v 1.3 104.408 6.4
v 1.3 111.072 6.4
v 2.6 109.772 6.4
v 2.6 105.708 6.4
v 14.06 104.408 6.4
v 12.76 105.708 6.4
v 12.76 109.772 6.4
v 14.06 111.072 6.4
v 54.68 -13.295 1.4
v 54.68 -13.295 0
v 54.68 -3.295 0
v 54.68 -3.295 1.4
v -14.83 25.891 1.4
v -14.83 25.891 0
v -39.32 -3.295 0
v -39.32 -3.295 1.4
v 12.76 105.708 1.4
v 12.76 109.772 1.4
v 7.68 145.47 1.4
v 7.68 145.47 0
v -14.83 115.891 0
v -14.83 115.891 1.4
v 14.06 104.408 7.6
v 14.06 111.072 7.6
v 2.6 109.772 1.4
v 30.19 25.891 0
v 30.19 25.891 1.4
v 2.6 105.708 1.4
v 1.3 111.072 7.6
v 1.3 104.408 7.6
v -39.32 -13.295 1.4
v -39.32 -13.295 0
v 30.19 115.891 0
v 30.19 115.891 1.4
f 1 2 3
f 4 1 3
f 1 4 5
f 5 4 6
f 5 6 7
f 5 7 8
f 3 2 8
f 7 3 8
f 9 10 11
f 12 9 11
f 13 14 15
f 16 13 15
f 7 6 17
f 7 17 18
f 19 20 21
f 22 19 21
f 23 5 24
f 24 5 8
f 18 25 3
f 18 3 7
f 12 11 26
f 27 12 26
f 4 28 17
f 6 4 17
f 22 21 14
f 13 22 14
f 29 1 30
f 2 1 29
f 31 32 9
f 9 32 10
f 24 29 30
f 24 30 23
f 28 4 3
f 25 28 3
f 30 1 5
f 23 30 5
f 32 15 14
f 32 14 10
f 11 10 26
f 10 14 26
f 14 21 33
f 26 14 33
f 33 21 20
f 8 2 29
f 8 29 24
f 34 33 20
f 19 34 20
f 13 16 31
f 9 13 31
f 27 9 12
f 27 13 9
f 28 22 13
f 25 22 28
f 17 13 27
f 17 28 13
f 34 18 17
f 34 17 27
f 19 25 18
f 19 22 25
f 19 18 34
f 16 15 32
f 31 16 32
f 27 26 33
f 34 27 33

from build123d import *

# Parameters (mm, degrees)
F1_DEPTH = 1.4
F2_W     = 10.16
F2_H     = 4.064
F3_DEPTH = 5
F4_W     = 12.76
F4_H     = 6.664
F5_DEPTH = 1.2


with BuildPart() as f1:
    # F0 (on Top) → F1 (new body)
    with BuildSketch(Plane.XY):
        Polygon((-39.320156, -3.294921), (-39.320156, -13.294921), (54.679844, -13.294921), (54.679844, -3.294921), (30.189636, 25.891372), (30.189636, 115.891372), (7.679844, 145.469573), (-14.829948, 115.891372), (-14.829948, 25.891372), align=None)
    extrude(amount=F1_DEPTH)

    # F2 (on face) → F3 (join)
    with BuildSketch(Plane.XY.offset(1.4)):
        with Locations((7.679844, 107.740323)):
            Rectangle(F2_W, F2_H)
    extrude(amount=F3_DEPTH)

    # F4 (on face) → F5 (join)
    with BuildSketch(Plane.XY.offset(6.4)):
        with Locations((7.679844, 107.740323)):
            Rectangle(F4_W, F4_H)
    extrude(amount=F5_DEPTH)


solid = f1.part
